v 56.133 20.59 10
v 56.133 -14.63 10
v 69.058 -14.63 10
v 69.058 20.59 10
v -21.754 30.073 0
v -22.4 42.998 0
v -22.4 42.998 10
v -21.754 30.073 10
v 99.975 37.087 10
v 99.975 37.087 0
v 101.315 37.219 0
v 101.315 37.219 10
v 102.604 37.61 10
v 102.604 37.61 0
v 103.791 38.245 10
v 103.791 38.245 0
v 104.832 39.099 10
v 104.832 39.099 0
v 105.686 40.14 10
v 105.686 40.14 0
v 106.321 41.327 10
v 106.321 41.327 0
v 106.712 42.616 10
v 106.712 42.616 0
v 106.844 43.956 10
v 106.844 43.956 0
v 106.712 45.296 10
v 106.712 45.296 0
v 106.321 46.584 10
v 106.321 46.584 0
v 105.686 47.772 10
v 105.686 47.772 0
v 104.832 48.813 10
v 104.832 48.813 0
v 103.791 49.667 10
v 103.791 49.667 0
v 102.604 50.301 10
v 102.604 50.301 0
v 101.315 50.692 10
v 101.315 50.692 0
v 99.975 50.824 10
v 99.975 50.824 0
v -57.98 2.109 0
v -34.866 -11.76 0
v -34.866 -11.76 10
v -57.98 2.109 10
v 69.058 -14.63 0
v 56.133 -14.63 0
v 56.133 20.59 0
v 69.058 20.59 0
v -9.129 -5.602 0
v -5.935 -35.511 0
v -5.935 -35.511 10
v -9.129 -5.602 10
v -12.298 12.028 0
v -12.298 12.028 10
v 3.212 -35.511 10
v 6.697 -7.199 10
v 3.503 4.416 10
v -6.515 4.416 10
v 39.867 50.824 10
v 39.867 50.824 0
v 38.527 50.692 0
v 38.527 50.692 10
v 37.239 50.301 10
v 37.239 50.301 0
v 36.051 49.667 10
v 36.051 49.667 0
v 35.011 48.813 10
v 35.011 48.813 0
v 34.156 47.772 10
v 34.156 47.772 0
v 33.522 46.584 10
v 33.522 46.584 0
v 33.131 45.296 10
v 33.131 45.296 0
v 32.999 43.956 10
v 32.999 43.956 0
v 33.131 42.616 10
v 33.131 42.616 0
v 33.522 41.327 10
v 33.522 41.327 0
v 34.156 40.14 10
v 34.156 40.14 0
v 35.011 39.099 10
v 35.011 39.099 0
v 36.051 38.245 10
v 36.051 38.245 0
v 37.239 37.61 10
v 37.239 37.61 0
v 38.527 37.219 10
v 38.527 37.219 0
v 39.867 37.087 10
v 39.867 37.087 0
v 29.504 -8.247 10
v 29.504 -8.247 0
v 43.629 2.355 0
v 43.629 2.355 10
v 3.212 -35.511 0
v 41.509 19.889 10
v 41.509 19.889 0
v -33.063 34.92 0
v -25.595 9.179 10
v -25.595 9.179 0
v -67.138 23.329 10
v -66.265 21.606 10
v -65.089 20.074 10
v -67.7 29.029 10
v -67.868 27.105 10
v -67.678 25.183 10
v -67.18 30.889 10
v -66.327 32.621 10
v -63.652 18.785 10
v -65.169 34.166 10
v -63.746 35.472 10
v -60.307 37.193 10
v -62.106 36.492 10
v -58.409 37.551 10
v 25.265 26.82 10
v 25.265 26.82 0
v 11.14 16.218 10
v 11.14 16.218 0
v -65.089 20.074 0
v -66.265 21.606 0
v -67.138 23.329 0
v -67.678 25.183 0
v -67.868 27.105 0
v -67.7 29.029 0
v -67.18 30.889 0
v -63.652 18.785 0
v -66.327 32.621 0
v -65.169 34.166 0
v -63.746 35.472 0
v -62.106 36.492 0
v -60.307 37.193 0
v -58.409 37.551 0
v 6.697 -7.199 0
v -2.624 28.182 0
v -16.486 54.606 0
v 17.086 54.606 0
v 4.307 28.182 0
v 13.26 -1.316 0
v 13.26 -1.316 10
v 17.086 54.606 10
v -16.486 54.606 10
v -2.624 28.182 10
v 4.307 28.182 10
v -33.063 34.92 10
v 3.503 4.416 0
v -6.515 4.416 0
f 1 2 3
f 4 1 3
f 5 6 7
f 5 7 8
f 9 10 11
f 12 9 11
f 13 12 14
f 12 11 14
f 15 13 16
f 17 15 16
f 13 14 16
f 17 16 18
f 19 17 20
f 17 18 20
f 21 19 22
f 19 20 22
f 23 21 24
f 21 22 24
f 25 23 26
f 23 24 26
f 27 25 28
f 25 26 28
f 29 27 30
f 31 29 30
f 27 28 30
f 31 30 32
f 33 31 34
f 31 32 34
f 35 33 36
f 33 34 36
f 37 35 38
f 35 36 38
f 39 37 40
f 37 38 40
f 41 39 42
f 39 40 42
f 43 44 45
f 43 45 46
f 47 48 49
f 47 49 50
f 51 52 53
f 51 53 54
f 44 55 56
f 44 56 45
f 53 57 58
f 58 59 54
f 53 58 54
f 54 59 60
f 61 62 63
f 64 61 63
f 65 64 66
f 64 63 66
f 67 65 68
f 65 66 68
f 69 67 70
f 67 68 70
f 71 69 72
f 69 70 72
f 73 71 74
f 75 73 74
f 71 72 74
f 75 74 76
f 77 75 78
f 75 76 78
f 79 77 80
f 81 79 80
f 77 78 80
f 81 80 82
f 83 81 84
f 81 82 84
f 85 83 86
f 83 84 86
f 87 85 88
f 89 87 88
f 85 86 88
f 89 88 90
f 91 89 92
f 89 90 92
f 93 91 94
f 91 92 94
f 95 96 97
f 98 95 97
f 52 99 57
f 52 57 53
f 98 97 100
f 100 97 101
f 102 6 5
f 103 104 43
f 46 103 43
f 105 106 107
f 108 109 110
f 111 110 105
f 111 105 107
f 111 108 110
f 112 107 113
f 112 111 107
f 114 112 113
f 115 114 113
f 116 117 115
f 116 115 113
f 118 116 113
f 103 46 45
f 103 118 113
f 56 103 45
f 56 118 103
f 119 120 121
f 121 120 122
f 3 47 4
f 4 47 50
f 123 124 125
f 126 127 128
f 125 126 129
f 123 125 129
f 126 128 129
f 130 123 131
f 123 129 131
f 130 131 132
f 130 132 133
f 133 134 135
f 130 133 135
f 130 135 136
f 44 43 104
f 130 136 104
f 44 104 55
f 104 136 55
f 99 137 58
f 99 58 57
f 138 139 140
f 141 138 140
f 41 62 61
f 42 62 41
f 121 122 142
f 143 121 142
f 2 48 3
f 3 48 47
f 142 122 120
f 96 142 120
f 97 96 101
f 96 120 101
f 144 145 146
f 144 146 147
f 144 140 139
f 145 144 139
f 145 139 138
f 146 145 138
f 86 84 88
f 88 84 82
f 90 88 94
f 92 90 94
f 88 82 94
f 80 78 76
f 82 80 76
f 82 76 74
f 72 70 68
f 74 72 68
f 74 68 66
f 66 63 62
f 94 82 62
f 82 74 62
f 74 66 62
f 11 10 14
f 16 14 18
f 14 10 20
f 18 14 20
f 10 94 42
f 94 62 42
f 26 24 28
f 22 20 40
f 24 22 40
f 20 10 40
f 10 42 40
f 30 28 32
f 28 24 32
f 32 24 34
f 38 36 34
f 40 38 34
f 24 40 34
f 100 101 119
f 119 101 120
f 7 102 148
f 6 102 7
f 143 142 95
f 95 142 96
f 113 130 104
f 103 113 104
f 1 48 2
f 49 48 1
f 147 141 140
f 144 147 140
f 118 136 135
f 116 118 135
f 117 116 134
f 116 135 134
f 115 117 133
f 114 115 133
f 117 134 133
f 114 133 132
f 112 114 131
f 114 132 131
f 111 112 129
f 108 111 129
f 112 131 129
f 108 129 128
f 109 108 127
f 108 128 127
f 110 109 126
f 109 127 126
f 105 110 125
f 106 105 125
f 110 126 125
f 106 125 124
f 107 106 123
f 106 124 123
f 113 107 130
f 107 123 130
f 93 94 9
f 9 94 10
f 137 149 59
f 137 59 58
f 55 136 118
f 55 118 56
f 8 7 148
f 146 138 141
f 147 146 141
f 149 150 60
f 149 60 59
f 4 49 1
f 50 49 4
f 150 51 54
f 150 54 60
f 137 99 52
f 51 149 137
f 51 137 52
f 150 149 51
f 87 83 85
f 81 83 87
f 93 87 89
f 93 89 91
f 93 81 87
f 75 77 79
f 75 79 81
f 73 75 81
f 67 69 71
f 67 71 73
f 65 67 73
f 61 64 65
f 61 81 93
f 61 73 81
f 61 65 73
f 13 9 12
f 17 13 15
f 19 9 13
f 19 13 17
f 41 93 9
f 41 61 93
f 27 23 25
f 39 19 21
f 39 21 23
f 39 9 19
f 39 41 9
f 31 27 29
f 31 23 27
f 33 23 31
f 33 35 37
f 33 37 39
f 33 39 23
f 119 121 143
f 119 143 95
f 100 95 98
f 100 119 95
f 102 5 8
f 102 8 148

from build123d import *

# Parameters (mm, degrees)
PAD_DEPTH    = 10
PAD001_DEPTH = 10
PAD002_DEPTH = 10
PAD004_DEPTH = 10
PAD003_DEPTH = 10
SKETCH005_W  = 12.924907
SKETCH005_H  = 35.220361
PAD005_DEPTH = 10
PAD006_DEPTH = 10


with BuildPart() as body:
    # Sketch → Pad (new body)
    with BuildSketch(Plane.XY):
        with BuildLine():
            ThreePointArc((-58.408873, 37.550903), (-67.483346, 29.970562), (-63.651543, 18.784637))
            Line((-63.651543, 18.784637), (-25.594664, 9.179181))
            Line((-25.594664, 9.179181), (-57.980099, 2.108736))
            Line((-34.866428, -11.760233), (-57.980099, 2.108736))
            Line((-12.297852, 12.027573), (-34.866428, -11.760233))
            Line((-58.408873, 37.550903), (-12.297852, 12.027573))
        make_face()
    extrude(amount=PAD_DEPTH)


with BuildPart() as body001:
    # Sketch001 → Pad001 (new body)
    with BuildSketch(Plane.XY):
        Polygon((43.629059, 2.35548), (41.509199, 19.889299), (25.264536, 26.820356), (11.139733, 16.217594), (13.259593, -1.316225), (29.504256, -8.247282), align=None)
    extrude(amount=PAD001_DEPTH)


with BuildPart() as body002:
    # Sketch002 → Pad002 (new body)
    with BuildSketch(Plane.XY):
        Polygon((-16.486094, 54.606373), (-2.623984, 28.181721), (4.307071, 28.181721), (17.08622, 54.606373), align=None)
    extrude(amount=PAD002_DEPTH)


with BuildPart() as body003:
    # Sketch004 → Pad004 (new body)
    with BuildSketch(Plane.XY):
        Polygon((-6.515382, 4.415754), (3.50262, 4.415754), (6.696762, -7.199317), (3.212241, -35.511051), (-5.934626, -35.511051), (-9.128774, -5.602243), align=None)
    extrude(amount=PAD004_DEPTH)


with BuildPart() as body004:
    # Sketch003 → Pad003 (new body)
    with BuildSketch(Plane.XY):
        with BuildLine():
            ThreePointArc((39.867291, 50.824239), (32.998878, 43.955826), (39.867291, 37.087413))
            Line((39.867291, 37.087413), (99.975288, 37.087413))
            ThreePointArc((99.975288, 37.087413), (106.843701, 43.955826), (99.975288, 50.824239))
            Line((39.867291, 50.824239), (99.975288, 50.824239))
        make_face()
    extrude(amount=PAD003_DEPTH)


with BuildPart() as body005:
    # Sketch005 → Pad005 (new body)
    with BuildSketch(Plane.XY):
        with Locations((62.595759, 2.979997)):
            Rectangle(SKETCH005_W, SKETCH005_H)
    extrude(amount=PAD005_DEPTH)


with BuildPart() as body006:
    # Sketch006 → Pad006 (new body)
    with BuildSketch(Plane.XY):
        Polygon((-33.063084, 34.91983), (-22.400038, 42.997898), (-21.753803, 30.072998), align=None)
    extrude(amount=PAD006_DEPTH)


solid = Compound([body.part, body001.part, body002.part, body003.part, body004.part, body005.part, body006.part])
